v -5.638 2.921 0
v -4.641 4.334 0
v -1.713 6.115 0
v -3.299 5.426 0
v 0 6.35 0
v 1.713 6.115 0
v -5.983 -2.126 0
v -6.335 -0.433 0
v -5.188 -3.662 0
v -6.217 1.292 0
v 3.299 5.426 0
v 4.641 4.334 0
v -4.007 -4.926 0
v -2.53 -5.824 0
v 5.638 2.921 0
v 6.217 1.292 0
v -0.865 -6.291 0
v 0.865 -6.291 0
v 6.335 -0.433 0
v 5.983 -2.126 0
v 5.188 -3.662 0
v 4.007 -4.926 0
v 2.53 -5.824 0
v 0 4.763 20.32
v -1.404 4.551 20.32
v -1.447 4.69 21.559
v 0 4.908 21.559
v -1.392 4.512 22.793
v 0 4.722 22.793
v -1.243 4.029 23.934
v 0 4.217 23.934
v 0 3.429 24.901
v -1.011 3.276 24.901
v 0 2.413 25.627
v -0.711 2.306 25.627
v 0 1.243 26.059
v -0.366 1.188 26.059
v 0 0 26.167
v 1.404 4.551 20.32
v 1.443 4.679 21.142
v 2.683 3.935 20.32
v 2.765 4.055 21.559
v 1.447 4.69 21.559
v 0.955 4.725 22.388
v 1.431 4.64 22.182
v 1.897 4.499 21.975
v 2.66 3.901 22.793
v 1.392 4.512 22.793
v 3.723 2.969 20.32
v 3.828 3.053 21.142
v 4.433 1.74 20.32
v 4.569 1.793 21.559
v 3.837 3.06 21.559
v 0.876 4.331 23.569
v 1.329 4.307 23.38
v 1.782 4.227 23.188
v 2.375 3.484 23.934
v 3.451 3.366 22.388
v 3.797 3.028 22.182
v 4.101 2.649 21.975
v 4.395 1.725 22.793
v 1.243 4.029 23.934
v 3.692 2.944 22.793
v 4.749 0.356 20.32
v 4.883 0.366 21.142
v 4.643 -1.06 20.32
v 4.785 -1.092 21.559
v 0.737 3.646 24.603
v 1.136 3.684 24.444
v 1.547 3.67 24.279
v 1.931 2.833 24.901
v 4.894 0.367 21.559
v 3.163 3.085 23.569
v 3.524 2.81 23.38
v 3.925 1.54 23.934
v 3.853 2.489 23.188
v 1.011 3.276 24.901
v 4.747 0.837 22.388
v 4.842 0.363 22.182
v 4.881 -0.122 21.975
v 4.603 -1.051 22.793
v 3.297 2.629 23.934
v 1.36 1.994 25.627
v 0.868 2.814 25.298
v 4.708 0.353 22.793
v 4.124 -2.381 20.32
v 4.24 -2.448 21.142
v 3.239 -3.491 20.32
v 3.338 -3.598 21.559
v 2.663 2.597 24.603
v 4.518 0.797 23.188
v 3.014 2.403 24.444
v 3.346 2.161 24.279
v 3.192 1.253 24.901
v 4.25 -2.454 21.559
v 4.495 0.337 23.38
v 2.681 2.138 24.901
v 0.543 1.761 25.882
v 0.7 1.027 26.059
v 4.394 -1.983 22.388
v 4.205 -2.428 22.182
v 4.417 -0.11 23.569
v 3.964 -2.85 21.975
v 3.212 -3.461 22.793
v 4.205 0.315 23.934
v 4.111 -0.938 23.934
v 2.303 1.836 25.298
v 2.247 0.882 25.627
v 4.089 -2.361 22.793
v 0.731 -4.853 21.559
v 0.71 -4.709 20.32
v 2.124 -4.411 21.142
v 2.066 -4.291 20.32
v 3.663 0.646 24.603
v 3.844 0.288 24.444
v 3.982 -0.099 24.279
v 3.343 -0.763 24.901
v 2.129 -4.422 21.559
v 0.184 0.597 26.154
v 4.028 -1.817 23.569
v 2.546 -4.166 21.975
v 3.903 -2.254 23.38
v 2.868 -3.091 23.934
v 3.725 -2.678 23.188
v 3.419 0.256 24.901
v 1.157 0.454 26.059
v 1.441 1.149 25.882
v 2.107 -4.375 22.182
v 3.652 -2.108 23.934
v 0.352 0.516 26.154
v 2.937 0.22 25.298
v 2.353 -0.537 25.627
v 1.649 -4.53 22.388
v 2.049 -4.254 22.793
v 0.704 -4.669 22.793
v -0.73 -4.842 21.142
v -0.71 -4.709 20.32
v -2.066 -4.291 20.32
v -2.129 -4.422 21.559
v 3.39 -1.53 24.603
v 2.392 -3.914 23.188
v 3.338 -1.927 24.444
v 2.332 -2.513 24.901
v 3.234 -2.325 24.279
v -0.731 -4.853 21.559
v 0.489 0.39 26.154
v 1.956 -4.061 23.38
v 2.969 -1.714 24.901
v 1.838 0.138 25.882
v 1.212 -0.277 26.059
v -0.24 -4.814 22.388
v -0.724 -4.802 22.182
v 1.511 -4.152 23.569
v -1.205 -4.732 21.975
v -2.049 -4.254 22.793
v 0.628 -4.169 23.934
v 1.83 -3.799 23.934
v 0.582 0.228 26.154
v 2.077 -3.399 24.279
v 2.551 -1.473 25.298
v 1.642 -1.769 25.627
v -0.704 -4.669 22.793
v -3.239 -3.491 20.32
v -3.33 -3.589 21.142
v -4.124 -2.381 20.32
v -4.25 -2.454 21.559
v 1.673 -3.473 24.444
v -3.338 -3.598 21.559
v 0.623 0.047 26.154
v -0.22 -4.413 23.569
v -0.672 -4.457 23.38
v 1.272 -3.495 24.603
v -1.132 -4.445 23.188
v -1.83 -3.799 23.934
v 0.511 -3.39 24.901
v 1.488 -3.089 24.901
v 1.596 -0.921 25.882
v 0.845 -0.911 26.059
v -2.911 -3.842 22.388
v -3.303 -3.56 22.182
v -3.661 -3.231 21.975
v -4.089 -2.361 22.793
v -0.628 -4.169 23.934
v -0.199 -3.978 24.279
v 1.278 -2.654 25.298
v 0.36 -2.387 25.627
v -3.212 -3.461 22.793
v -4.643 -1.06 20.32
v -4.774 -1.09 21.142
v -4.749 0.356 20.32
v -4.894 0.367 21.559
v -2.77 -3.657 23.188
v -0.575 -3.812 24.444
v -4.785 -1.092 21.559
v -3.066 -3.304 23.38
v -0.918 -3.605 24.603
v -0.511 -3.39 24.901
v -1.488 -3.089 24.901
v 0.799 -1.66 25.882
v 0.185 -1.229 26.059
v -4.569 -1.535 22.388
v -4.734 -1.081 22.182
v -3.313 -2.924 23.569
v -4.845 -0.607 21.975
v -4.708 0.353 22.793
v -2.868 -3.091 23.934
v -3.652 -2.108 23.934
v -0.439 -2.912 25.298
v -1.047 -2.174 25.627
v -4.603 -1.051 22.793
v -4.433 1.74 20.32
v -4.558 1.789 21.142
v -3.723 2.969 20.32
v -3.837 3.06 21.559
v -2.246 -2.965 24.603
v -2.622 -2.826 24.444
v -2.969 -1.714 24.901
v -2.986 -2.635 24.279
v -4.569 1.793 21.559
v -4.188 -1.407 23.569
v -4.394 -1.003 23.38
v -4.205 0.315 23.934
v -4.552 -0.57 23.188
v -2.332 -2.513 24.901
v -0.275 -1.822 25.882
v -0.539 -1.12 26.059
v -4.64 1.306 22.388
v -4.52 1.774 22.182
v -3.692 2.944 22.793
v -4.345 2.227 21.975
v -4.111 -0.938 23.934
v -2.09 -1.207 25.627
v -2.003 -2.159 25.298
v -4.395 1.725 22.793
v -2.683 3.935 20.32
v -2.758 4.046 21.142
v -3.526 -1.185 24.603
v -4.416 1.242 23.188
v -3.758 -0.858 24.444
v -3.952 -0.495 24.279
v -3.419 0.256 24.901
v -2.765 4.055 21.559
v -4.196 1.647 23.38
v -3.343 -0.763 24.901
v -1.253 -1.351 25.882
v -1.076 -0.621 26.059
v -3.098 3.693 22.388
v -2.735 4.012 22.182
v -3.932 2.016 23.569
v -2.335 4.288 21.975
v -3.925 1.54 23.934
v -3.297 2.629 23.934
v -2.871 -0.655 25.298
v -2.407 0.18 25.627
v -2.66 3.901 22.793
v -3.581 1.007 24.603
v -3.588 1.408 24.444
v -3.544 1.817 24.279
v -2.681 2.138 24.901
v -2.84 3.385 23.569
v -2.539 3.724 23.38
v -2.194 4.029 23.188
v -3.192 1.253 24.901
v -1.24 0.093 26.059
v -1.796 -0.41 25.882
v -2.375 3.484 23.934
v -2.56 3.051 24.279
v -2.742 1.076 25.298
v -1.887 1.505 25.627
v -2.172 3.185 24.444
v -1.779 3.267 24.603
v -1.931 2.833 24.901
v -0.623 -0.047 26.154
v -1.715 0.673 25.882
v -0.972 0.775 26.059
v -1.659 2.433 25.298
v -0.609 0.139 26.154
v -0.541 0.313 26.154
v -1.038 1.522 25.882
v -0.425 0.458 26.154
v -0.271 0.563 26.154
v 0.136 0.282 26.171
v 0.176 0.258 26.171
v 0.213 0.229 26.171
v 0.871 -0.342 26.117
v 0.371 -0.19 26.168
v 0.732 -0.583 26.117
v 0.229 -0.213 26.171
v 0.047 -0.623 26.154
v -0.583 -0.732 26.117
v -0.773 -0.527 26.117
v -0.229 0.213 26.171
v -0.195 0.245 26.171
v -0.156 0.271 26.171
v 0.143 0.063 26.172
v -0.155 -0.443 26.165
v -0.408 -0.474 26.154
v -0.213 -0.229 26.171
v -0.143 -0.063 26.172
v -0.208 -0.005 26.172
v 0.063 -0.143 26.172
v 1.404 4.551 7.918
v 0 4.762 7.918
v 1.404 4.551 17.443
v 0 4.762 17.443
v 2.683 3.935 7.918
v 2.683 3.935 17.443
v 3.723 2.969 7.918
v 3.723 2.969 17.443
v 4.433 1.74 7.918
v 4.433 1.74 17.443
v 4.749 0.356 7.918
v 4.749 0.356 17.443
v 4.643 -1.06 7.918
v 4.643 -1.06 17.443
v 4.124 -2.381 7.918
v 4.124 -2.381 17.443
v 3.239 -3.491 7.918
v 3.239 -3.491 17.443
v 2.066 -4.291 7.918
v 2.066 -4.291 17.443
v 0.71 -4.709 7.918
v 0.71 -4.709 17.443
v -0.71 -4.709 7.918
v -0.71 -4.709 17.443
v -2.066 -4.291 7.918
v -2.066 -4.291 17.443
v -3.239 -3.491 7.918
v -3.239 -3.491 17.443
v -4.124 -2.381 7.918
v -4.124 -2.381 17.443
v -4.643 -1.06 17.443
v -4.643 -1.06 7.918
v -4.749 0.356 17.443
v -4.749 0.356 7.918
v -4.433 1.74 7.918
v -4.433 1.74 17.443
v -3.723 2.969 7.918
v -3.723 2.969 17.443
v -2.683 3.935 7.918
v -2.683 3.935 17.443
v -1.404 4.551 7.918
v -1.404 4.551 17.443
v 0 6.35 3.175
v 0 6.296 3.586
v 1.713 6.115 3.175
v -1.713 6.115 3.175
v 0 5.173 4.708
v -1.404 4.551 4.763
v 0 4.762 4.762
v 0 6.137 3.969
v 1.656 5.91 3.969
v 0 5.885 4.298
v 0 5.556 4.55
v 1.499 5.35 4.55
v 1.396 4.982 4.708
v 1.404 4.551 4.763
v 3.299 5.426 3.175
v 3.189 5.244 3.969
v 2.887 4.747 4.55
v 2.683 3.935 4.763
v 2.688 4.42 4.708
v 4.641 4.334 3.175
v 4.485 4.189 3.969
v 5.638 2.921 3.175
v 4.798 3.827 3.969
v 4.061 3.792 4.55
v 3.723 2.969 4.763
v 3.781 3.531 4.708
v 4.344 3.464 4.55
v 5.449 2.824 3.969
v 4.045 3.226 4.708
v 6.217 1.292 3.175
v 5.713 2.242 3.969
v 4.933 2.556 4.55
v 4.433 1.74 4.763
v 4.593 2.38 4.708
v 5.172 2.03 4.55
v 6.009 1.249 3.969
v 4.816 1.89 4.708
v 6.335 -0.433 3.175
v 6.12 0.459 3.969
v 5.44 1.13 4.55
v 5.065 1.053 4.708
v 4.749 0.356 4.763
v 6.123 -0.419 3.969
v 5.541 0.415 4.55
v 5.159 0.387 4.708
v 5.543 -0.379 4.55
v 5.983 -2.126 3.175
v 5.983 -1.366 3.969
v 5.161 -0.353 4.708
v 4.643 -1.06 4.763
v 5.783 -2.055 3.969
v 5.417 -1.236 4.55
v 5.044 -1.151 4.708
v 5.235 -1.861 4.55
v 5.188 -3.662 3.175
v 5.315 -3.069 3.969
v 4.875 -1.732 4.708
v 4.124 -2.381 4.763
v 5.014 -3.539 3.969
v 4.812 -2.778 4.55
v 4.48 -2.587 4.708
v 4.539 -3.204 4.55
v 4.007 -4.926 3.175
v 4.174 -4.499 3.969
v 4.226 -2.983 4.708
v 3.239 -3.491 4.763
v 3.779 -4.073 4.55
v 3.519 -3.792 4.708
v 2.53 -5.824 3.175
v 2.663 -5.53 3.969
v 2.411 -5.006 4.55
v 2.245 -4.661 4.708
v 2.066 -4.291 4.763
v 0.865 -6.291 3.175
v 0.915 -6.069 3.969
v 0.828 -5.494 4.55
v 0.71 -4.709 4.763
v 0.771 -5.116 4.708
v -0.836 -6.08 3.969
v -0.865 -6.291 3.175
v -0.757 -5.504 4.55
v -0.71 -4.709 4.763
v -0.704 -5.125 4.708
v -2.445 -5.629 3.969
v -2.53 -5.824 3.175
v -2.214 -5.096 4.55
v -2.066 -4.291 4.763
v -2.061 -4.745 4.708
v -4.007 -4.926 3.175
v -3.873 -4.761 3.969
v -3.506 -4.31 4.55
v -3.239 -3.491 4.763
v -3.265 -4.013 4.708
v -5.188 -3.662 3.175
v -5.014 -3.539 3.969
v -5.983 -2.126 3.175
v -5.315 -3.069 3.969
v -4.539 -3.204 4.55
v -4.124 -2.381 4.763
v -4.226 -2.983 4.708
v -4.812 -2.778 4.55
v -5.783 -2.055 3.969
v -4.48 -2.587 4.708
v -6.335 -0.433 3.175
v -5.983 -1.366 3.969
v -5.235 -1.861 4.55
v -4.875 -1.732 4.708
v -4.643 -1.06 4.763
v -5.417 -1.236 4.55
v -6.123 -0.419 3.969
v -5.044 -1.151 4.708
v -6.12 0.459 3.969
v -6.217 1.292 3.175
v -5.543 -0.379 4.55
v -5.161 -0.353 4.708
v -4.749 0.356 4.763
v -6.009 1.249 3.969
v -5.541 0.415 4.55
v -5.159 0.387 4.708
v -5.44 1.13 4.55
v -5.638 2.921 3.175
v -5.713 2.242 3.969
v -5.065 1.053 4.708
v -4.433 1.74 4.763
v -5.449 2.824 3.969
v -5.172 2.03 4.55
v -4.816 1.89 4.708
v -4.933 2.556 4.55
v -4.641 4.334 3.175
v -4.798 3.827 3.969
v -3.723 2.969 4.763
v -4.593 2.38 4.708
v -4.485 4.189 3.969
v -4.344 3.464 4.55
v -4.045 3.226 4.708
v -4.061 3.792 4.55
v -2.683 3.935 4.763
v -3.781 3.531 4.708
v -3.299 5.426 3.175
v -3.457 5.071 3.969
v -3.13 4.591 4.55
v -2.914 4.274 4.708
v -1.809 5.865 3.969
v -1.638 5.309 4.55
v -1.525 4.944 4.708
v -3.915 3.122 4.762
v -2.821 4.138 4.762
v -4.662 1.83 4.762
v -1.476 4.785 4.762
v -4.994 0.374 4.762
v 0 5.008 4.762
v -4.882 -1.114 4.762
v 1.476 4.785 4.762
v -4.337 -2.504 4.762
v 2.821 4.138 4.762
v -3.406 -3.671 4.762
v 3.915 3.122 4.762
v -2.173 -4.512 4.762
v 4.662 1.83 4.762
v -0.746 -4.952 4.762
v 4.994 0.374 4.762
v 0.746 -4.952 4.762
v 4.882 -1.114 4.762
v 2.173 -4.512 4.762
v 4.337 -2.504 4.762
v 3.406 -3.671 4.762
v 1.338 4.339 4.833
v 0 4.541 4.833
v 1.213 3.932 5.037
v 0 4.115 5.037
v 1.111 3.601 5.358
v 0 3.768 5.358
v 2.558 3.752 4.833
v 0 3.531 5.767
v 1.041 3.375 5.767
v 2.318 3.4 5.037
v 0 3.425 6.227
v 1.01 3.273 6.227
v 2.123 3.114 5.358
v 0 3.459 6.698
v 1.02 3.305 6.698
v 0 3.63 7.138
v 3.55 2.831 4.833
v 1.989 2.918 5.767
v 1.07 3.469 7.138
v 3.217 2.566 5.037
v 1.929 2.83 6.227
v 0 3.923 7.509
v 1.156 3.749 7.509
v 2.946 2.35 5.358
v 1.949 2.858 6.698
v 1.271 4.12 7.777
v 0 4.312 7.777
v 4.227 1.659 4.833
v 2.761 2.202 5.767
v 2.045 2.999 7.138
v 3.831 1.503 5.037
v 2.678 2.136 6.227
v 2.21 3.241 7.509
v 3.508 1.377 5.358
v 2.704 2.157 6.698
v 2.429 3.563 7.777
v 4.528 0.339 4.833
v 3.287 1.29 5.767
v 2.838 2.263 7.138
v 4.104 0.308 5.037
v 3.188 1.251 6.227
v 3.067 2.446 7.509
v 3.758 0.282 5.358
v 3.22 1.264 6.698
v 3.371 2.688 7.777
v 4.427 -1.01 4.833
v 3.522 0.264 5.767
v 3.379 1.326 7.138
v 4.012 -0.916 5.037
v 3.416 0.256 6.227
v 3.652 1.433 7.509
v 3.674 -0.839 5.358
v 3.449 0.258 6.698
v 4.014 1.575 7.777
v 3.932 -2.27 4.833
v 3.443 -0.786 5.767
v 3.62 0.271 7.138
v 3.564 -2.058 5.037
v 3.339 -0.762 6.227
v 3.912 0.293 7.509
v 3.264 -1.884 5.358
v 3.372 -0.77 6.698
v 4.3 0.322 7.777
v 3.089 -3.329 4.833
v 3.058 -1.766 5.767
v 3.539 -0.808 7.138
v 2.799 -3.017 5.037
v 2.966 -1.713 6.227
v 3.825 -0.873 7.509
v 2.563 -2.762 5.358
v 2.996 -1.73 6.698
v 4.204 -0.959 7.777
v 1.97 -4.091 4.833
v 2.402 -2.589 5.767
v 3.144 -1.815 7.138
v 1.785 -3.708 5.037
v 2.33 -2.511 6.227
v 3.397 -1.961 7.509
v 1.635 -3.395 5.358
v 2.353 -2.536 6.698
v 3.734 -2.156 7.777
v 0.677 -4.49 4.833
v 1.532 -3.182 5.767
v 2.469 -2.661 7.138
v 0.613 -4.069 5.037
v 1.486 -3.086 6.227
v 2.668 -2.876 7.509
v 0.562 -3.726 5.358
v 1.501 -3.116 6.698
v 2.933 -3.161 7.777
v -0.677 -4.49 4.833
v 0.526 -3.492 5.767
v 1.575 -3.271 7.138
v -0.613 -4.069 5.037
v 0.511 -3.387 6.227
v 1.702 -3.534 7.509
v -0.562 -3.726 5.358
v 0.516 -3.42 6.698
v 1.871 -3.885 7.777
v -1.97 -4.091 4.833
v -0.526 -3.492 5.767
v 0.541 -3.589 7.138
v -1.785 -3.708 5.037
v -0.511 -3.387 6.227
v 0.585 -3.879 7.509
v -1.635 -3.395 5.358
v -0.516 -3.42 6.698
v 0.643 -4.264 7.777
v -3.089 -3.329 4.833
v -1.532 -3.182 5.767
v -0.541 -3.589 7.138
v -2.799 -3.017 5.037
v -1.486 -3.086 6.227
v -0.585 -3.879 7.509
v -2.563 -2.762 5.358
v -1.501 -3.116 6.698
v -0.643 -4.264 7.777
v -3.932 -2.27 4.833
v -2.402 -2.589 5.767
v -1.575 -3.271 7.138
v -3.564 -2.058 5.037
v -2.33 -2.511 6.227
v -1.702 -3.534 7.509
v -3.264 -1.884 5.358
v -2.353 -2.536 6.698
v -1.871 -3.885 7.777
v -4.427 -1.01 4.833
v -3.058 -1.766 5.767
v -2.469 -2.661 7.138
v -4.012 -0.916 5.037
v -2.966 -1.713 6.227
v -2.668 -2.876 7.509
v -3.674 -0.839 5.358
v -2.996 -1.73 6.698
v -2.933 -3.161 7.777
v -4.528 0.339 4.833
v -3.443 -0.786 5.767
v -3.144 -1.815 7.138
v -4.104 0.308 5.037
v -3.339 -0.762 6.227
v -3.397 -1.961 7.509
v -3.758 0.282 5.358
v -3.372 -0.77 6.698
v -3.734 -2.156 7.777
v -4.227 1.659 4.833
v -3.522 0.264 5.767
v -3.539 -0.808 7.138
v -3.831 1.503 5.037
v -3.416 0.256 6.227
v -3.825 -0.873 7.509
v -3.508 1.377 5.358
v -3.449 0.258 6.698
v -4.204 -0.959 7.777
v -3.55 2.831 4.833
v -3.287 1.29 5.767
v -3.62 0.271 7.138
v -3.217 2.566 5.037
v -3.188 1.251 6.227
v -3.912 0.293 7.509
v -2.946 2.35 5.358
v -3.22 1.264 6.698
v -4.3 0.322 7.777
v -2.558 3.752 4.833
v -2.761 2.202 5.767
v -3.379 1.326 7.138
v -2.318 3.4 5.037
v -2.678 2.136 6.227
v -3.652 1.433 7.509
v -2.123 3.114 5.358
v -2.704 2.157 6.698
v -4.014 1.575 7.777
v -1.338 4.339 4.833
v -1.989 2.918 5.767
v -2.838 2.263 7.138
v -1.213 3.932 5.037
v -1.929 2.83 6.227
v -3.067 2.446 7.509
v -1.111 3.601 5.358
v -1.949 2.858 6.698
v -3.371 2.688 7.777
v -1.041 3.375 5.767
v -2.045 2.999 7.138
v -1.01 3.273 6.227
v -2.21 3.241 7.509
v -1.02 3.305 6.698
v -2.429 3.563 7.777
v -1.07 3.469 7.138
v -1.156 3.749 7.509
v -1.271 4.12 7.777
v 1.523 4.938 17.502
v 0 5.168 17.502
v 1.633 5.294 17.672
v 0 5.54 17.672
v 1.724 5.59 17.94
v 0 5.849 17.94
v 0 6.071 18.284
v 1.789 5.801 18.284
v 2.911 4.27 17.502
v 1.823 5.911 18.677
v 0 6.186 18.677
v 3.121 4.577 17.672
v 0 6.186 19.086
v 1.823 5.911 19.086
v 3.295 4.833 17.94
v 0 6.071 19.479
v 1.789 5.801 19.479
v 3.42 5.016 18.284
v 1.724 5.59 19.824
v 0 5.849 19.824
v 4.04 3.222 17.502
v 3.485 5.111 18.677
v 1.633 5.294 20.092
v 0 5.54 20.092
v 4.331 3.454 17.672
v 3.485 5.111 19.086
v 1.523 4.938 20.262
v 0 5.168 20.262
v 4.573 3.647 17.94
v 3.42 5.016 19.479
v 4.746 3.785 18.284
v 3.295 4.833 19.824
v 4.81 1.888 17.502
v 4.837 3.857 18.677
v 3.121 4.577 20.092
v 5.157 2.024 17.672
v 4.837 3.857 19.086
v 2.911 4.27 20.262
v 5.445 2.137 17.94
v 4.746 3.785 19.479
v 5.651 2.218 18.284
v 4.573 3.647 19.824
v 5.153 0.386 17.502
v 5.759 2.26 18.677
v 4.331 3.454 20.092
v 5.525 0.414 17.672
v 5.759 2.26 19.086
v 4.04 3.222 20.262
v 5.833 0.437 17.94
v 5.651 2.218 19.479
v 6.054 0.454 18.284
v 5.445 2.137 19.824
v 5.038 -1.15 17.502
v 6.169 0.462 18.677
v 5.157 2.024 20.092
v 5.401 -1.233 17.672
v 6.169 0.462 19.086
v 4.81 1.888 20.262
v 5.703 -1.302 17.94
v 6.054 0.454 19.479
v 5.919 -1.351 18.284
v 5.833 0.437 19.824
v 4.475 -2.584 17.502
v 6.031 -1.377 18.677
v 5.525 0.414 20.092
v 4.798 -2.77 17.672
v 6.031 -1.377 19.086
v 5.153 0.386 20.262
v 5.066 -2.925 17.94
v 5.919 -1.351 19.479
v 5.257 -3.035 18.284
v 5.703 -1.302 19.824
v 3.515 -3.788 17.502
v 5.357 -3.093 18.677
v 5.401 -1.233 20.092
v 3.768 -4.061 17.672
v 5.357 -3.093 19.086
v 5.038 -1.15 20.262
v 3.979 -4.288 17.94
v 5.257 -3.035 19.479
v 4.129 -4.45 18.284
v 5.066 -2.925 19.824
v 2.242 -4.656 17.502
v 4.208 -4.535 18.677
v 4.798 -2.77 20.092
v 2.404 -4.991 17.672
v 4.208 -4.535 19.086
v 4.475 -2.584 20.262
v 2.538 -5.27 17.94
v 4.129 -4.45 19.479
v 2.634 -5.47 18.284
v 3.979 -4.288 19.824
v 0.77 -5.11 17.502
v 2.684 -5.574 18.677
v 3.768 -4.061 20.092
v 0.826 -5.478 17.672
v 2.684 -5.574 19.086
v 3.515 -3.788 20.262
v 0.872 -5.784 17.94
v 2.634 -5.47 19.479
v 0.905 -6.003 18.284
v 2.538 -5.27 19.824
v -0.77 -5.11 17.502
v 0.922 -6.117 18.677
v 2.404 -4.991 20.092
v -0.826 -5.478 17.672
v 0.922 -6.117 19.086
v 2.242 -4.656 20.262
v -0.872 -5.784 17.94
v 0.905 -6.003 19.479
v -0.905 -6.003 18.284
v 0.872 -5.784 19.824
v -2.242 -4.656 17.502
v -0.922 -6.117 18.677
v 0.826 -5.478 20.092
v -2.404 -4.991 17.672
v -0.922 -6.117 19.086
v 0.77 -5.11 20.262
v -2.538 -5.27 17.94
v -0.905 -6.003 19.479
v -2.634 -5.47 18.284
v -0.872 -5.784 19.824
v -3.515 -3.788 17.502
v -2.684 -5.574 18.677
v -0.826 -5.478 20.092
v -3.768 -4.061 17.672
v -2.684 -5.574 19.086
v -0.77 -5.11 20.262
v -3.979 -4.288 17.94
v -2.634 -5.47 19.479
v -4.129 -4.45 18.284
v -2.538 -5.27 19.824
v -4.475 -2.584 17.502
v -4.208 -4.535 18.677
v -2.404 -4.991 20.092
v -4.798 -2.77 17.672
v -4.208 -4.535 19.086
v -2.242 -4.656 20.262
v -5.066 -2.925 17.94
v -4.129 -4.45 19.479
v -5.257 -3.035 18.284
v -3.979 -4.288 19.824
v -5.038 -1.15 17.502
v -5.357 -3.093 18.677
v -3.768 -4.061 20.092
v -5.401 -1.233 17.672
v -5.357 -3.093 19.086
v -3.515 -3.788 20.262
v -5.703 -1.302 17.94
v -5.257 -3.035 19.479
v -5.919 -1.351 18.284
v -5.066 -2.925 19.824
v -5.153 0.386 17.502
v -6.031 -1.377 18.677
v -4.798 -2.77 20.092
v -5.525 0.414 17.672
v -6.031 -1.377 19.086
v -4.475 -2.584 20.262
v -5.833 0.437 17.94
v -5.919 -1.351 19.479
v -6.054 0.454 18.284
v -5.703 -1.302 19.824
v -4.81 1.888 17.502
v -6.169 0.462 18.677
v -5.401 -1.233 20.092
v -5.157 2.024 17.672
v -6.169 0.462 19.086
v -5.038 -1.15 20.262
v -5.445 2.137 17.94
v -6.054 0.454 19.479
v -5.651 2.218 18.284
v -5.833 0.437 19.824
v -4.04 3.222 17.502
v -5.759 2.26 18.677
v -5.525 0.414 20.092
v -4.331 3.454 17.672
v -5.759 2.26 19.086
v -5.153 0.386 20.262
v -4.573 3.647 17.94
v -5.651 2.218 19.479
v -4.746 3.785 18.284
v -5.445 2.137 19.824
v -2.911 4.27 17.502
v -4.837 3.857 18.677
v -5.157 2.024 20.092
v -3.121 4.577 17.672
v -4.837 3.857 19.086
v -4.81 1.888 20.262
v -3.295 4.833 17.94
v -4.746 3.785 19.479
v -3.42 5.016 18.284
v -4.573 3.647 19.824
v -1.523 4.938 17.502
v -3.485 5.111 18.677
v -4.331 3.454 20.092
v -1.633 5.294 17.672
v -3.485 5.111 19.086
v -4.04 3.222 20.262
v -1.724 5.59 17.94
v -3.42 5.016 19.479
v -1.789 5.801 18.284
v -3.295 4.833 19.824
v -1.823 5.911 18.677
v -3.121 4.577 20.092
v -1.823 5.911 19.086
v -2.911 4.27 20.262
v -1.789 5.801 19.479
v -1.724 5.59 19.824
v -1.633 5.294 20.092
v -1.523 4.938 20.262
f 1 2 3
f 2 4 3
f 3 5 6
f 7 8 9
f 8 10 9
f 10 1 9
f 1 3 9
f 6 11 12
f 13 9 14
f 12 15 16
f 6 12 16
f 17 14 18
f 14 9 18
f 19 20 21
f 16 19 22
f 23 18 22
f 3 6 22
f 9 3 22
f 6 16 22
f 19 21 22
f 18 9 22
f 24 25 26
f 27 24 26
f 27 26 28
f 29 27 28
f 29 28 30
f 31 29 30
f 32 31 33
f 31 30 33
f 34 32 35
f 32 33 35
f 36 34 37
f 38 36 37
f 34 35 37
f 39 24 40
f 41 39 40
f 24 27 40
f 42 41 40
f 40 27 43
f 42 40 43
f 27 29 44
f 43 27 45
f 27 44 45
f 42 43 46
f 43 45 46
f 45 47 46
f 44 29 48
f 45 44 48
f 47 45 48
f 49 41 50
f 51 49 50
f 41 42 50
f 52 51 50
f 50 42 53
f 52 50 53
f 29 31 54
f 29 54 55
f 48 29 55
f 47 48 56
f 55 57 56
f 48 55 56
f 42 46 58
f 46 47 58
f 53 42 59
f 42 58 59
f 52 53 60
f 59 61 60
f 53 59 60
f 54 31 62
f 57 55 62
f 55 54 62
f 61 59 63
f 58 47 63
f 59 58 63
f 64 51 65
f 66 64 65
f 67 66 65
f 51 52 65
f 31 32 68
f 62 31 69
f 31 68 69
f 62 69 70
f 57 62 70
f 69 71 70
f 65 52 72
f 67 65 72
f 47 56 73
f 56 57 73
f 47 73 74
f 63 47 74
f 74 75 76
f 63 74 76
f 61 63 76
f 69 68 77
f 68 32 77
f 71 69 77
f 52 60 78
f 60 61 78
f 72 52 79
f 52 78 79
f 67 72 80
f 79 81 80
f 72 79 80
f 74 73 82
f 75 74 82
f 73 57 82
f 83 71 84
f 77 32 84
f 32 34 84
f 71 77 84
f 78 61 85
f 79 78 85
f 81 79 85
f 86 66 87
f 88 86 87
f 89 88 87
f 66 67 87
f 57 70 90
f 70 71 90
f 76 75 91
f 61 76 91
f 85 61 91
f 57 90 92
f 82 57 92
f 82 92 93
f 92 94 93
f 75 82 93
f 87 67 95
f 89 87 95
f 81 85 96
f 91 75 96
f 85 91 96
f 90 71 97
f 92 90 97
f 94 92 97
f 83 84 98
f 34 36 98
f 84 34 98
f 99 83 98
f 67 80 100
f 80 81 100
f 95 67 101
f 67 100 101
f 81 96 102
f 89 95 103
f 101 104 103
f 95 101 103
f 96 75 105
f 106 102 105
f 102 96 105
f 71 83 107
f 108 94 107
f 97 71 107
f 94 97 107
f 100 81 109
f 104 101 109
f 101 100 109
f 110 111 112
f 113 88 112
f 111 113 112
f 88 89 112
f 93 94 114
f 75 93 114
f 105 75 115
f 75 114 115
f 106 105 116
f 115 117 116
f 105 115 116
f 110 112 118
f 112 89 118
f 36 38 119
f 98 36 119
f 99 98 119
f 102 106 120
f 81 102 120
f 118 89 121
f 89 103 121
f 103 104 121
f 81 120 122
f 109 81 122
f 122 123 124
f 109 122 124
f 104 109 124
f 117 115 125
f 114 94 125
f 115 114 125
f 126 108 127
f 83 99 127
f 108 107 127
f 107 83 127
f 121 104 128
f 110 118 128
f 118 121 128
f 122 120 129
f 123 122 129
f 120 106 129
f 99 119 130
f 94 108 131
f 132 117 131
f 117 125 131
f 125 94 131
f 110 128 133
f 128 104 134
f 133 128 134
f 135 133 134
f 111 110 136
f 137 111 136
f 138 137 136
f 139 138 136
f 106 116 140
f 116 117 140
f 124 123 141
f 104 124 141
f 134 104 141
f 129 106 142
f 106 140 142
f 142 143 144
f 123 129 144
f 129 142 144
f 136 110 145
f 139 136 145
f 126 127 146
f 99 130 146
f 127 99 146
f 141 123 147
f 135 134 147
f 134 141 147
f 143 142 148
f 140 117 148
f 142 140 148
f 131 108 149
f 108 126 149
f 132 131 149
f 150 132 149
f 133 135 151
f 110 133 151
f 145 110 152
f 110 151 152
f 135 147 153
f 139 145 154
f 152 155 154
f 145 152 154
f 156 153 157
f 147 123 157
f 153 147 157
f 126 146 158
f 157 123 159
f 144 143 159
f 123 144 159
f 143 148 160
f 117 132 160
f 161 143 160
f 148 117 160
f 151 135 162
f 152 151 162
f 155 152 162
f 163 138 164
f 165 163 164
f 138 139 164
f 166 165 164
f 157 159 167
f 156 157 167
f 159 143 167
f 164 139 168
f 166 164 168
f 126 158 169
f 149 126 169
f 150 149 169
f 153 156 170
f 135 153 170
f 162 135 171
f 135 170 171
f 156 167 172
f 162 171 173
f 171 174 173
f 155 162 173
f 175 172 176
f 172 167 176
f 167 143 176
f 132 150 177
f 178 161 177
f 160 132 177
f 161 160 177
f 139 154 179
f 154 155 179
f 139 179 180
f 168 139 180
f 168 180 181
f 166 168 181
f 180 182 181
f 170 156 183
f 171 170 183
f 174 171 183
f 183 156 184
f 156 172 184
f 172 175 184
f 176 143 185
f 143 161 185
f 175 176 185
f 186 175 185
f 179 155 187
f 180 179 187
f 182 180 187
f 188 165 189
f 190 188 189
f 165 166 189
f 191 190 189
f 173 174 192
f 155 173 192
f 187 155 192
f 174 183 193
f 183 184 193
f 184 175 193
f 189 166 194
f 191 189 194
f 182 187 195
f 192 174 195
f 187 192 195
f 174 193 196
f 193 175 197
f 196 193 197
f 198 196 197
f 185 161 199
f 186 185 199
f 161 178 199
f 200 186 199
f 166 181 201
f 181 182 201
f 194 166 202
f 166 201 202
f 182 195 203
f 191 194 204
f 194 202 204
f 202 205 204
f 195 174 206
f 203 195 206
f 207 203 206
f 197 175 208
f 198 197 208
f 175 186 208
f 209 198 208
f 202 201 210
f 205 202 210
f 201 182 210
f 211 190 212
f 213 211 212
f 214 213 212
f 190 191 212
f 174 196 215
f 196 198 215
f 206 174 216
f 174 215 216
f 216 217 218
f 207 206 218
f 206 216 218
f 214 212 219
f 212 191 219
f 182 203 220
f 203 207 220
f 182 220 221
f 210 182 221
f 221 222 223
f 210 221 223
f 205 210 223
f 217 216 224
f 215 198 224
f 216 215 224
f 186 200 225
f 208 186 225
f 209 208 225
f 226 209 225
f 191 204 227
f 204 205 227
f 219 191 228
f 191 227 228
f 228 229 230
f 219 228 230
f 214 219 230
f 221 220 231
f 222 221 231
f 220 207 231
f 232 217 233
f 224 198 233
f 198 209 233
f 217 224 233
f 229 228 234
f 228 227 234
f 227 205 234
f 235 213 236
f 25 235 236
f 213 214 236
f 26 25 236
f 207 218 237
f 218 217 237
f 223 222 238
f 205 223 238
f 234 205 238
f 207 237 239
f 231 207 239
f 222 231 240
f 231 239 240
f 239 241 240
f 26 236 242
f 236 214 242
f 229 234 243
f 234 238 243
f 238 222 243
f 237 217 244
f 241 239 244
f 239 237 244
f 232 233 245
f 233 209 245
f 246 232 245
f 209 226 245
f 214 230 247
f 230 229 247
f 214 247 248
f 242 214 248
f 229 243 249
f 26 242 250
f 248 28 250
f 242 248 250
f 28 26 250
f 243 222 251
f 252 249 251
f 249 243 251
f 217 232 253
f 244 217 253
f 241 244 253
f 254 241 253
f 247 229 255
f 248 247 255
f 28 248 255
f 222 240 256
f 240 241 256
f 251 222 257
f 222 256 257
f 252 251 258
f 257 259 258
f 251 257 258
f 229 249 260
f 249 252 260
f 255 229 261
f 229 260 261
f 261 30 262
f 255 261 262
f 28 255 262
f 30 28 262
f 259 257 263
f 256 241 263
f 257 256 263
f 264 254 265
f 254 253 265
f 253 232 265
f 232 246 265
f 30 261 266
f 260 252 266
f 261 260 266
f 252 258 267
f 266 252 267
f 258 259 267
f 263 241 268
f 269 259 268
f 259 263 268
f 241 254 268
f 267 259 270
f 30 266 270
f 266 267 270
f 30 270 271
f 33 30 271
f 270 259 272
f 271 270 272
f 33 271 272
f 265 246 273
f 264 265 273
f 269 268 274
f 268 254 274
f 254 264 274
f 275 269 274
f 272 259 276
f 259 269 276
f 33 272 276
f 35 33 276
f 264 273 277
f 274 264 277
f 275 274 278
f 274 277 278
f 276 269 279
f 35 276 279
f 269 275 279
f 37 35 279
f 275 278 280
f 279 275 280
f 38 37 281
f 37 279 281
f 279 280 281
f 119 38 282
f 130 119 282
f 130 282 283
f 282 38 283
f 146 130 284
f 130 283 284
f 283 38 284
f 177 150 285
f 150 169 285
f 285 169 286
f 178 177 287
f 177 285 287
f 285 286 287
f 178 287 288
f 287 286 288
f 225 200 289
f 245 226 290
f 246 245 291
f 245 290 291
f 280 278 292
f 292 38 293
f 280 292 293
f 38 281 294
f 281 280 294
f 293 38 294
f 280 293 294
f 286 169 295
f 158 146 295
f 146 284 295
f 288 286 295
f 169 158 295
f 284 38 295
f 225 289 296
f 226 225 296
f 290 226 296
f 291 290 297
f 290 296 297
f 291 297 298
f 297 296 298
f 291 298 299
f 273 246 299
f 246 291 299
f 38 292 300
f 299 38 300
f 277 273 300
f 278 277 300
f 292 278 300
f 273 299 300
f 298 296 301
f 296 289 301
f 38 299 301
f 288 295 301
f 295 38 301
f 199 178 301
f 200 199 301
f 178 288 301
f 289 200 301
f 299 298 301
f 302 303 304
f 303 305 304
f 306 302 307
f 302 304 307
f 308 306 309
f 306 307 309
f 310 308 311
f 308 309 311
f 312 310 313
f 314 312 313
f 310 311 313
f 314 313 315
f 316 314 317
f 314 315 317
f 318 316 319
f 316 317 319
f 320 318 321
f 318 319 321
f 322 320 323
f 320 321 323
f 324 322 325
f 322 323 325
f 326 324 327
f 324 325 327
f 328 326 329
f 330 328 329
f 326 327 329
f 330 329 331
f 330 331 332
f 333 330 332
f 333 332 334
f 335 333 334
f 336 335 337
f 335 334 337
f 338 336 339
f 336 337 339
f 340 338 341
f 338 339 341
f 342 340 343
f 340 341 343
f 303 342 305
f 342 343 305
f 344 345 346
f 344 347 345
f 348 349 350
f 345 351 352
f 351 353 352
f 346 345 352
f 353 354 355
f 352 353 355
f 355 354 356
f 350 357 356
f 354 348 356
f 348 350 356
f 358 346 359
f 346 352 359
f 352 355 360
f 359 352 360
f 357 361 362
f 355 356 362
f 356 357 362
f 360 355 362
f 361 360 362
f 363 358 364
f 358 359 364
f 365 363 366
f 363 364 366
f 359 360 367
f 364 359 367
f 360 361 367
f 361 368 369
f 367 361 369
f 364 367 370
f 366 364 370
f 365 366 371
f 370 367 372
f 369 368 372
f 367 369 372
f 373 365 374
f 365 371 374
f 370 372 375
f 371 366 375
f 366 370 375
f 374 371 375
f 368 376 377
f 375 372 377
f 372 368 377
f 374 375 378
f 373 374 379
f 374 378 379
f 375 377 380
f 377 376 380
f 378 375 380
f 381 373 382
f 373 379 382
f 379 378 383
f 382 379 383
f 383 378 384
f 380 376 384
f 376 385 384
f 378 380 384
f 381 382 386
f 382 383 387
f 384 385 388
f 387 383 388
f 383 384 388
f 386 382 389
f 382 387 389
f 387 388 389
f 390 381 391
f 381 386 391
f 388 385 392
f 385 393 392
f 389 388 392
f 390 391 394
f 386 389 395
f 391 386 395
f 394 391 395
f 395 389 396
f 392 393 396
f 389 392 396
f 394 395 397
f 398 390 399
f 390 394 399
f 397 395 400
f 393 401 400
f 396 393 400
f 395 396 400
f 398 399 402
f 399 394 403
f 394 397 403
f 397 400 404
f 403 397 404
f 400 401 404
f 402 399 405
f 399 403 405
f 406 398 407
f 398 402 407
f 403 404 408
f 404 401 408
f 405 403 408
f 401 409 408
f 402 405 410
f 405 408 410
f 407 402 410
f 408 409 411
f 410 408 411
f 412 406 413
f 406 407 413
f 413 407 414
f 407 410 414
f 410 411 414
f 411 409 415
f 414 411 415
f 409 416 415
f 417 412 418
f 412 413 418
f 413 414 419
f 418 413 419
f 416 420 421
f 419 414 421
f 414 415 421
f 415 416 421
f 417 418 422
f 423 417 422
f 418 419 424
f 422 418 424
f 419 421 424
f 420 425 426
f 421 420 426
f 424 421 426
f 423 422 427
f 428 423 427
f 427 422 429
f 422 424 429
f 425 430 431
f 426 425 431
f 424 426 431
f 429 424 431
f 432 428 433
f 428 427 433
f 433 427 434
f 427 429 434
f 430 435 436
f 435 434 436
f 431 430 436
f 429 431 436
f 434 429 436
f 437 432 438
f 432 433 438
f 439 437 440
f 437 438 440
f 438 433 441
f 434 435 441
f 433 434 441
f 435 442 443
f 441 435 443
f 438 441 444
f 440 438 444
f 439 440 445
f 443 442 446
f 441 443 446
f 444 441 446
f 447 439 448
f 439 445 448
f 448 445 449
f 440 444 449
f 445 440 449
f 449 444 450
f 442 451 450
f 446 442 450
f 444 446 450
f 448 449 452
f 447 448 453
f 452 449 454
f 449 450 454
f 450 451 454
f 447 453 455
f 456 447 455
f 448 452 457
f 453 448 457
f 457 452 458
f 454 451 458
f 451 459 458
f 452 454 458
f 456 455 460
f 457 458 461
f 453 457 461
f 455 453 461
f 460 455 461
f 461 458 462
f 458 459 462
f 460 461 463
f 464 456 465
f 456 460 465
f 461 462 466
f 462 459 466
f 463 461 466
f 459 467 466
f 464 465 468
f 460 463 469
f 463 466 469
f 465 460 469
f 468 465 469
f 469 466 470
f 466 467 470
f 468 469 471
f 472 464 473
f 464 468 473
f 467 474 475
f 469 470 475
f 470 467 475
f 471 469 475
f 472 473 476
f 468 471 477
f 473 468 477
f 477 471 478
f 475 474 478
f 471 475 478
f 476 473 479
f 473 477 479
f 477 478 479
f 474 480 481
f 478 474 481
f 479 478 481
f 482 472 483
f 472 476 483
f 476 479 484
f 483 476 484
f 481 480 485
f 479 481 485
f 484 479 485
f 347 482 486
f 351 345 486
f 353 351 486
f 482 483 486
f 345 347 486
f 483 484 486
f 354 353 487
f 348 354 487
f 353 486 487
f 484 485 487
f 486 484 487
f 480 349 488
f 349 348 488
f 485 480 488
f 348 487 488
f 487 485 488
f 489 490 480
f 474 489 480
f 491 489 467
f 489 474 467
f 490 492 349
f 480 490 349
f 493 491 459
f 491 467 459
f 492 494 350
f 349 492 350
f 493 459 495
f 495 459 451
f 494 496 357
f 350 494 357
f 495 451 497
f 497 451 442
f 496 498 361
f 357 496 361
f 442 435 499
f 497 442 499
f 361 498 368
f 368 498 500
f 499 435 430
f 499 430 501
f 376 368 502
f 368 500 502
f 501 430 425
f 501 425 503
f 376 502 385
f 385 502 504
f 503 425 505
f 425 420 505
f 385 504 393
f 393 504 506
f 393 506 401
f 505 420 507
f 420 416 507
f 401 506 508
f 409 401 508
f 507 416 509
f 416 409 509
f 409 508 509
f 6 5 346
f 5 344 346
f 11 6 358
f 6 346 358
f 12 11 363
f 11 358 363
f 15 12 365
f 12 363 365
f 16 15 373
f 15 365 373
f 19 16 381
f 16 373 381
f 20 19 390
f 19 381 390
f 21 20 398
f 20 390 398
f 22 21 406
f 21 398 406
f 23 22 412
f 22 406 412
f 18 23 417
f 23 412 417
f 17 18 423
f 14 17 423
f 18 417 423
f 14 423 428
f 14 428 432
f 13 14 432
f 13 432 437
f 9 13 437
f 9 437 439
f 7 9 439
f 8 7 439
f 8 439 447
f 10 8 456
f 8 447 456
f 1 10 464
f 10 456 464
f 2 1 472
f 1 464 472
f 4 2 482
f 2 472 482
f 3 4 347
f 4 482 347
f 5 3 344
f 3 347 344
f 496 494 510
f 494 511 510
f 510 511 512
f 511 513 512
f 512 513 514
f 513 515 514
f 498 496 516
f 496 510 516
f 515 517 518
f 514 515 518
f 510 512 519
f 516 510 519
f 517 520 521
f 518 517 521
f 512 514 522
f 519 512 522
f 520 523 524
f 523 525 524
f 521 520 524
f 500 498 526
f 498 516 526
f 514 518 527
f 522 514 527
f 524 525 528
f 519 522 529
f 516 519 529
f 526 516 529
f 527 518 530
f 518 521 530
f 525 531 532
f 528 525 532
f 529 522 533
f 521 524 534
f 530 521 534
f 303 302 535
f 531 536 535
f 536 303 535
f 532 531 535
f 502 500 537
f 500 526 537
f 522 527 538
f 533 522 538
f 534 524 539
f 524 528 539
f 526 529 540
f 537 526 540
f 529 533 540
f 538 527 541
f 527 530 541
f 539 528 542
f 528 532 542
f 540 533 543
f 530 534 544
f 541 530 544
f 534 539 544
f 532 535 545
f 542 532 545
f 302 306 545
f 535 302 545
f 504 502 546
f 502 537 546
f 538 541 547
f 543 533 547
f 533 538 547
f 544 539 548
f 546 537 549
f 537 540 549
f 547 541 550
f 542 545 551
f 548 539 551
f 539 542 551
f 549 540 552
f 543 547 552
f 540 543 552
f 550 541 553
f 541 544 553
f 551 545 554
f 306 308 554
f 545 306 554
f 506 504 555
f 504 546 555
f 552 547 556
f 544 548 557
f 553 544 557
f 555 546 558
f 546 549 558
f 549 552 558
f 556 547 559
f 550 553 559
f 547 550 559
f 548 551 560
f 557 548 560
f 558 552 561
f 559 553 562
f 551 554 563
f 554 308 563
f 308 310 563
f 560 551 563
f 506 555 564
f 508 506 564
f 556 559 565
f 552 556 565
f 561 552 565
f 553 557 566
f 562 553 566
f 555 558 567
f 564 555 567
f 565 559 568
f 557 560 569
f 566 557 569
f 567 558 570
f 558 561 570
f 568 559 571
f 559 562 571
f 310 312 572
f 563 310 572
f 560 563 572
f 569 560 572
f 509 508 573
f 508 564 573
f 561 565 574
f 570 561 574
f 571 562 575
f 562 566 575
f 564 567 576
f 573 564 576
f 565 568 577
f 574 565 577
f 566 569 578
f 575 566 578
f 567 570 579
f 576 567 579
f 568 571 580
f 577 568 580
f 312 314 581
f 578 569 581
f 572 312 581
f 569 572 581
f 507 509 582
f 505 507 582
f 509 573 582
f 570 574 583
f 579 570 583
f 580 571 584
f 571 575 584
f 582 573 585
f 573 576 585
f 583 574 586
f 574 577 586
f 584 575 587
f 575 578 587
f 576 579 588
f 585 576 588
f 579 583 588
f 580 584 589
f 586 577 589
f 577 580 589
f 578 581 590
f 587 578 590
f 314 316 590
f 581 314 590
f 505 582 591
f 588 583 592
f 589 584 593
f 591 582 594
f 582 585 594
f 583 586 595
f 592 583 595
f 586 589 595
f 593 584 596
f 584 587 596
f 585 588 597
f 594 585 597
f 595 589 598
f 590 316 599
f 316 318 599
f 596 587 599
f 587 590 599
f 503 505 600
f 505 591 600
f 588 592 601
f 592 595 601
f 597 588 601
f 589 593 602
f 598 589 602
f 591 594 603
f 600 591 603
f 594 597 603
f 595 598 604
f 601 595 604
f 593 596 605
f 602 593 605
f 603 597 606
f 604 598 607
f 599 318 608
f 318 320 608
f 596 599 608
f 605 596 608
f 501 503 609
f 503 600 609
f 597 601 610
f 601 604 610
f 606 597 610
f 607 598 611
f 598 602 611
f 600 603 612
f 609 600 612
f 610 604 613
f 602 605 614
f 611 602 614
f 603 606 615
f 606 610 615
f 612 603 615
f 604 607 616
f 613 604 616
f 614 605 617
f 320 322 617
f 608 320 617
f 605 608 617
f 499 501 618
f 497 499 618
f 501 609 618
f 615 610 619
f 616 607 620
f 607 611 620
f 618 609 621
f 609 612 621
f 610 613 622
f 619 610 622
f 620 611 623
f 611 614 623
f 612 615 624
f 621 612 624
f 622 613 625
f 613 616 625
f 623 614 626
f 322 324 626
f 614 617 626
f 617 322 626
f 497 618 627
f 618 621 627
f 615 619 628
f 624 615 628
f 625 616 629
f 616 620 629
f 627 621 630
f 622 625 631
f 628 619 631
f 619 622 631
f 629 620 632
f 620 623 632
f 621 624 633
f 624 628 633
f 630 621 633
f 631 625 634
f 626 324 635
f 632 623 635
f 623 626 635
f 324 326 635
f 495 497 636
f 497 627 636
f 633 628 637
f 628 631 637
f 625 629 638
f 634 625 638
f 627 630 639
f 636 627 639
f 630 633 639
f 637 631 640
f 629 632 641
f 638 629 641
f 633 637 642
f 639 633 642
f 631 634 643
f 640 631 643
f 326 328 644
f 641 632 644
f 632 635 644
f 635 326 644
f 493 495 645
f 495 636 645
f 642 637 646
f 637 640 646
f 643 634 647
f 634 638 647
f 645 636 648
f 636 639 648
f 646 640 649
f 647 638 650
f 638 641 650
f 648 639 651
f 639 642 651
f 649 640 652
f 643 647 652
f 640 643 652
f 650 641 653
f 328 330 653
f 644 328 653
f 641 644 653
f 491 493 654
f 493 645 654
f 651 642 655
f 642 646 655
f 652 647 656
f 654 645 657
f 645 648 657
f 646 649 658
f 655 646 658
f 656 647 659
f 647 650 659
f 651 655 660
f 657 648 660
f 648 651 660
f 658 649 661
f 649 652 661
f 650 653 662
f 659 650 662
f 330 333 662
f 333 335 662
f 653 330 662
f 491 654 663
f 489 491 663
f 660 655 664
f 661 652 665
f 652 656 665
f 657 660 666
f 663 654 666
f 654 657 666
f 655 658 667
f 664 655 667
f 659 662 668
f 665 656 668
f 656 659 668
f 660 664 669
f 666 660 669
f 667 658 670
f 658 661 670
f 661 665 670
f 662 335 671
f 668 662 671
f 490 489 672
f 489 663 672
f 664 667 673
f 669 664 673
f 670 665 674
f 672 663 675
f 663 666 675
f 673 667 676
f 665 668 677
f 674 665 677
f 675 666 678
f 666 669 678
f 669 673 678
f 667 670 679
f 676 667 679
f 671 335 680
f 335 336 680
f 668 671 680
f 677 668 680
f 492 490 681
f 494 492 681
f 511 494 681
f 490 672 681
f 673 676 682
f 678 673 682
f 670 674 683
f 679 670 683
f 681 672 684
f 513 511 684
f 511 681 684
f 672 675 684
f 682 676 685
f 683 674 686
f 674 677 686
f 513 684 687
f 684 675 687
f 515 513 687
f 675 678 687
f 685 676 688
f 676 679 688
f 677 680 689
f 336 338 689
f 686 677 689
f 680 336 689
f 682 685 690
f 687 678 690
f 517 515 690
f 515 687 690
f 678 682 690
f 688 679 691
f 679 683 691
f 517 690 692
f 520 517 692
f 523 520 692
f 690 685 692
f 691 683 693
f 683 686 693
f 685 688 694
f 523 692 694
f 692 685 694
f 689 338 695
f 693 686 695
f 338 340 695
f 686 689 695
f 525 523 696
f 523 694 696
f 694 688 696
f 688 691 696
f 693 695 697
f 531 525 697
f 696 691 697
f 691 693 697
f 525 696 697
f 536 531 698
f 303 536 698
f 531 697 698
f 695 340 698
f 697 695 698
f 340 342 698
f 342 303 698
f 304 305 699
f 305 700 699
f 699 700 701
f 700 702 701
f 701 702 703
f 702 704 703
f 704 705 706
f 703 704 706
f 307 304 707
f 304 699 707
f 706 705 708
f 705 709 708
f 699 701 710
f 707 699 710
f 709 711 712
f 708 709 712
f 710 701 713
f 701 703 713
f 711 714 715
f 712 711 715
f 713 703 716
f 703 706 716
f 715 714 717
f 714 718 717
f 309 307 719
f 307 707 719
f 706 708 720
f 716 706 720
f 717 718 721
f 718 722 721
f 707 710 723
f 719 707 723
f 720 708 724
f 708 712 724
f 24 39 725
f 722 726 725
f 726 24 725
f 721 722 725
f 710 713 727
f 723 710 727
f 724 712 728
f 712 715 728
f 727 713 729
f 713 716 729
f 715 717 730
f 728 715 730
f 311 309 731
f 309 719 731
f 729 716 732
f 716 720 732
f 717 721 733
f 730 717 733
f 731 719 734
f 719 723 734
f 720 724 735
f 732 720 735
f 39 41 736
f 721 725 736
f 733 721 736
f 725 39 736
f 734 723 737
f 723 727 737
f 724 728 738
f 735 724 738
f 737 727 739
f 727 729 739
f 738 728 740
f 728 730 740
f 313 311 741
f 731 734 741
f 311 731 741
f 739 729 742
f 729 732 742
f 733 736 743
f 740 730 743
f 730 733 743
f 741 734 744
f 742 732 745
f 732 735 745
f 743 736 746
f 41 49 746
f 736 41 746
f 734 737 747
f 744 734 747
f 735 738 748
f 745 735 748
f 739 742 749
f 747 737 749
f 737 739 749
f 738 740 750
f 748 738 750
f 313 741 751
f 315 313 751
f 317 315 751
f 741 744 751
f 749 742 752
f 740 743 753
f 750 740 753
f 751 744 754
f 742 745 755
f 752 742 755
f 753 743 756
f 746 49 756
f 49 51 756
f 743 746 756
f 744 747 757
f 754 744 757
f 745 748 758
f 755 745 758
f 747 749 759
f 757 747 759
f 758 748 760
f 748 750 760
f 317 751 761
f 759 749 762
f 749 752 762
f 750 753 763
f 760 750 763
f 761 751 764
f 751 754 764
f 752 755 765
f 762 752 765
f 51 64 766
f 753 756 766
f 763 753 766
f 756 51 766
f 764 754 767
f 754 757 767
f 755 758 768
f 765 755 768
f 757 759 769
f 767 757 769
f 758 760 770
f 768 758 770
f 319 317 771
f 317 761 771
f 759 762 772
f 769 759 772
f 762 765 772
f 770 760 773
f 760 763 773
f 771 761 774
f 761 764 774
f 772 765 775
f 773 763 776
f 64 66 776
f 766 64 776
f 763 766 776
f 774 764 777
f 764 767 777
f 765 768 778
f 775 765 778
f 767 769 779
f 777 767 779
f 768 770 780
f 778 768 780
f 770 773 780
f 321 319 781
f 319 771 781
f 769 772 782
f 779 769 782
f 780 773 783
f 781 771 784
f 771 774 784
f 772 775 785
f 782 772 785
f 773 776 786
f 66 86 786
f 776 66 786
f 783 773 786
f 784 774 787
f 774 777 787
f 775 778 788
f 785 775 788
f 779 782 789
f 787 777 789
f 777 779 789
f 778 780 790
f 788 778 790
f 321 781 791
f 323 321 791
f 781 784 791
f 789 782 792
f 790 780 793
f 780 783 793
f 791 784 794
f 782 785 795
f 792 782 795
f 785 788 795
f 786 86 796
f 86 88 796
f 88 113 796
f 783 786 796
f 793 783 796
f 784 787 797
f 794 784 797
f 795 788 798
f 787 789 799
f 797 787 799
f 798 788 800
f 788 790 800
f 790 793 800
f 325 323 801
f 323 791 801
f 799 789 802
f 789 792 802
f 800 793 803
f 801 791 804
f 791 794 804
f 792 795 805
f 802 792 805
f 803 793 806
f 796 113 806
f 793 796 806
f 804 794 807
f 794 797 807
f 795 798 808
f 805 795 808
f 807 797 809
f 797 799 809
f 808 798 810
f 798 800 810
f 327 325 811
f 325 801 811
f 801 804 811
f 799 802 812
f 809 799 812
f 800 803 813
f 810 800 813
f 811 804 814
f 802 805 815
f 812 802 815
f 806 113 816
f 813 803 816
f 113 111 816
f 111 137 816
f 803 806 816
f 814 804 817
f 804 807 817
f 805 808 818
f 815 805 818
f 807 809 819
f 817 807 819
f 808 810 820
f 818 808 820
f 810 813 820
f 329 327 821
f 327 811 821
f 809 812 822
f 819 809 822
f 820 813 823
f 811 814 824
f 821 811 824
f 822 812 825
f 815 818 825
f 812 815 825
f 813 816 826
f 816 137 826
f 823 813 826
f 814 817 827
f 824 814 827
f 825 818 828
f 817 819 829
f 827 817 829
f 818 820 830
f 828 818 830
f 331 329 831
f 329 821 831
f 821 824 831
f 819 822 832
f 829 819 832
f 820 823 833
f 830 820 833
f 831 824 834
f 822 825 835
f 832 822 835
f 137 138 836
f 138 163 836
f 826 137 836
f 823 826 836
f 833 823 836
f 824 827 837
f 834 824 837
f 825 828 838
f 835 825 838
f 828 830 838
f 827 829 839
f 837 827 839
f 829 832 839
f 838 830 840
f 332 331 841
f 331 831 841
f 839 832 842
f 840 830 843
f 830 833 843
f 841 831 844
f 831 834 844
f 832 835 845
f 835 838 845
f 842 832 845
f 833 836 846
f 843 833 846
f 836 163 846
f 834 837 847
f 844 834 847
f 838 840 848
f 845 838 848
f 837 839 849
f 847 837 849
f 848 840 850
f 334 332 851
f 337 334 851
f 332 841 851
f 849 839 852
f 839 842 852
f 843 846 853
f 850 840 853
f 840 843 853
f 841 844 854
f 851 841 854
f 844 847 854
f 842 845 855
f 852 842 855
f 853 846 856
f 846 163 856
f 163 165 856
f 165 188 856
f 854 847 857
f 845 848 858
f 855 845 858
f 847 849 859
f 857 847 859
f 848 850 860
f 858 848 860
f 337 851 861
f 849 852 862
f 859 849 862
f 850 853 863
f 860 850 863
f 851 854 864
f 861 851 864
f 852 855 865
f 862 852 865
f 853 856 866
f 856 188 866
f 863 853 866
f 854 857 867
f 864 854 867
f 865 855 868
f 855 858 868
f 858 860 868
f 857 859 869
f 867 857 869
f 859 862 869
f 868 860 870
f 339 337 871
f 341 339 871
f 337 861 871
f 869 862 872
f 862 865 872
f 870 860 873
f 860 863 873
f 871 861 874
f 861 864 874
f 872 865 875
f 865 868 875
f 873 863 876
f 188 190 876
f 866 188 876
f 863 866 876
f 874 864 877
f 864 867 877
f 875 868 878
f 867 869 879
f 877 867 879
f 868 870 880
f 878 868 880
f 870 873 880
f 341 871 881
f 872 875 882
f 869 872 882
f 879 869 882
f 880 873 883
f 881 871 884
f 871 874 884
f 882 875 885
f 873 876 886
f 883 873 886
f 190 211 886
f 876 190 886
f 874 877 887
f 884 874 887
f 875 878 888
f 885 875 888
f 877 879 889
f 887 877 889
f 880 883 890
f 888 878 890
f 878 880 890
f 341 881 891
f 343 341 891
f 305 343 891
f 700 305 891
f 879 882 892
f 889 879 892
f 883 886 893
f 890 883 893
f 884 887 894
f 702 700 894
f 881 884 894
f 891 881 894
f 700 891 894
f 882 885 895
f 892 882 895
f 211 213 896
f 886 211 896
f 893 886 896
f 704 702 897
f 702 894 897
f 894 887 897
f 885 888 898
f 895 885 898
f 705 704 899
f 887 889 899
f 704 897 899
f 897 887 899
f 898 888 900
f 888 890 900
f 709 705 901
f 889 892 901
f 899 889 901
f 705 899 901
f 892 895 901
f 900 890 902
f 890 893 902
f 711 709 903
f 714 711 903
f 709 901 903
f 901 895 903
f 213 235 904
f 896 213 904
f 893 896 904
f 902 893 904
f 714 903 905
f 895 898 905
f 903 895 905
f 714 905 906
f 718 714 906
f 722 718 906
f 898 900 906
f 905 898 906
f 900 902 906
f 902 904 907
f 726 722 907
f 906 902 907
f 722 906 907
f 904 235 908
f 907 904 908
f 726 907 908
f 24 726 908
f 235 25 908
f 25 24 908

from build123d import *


with BuildPart() as f1:
    # F0 (on Right) → F1 (revolve)
    with BuildSketch(Plane.YZ):
        with BuildLine():
            Line((0, 26.166892), (0, 0))
            Line((0, 0), (6.35, 0))
            Line((6.35, 0), (6.35, 3.175))
            ThreePointArc((6.35, 3.175), (5.885032, 4.297532), (4.7625, 4.7625))
            Line((4.7625, 4.7625), (5.007925, 4.7625))
            ThreePointArc((5.007925, 4.7625), (3.425204, 6.226917), (4.7625, 7.918414))
            Line((4.7625, 7.918414), (4.7625, 17.443414))
            ThreePointArc((4.7625, 17.443414), (6.200793, 18.881707), (4.7625, 20.32))
            ThreePointArc((4.7625, 20.32), (3.854894, 24.443781), (0, 26.166892))
        make_face()
    revolve(axis=Axis((0, 0, 13.083446), (0, 0, -1)))


solid = f1.part
